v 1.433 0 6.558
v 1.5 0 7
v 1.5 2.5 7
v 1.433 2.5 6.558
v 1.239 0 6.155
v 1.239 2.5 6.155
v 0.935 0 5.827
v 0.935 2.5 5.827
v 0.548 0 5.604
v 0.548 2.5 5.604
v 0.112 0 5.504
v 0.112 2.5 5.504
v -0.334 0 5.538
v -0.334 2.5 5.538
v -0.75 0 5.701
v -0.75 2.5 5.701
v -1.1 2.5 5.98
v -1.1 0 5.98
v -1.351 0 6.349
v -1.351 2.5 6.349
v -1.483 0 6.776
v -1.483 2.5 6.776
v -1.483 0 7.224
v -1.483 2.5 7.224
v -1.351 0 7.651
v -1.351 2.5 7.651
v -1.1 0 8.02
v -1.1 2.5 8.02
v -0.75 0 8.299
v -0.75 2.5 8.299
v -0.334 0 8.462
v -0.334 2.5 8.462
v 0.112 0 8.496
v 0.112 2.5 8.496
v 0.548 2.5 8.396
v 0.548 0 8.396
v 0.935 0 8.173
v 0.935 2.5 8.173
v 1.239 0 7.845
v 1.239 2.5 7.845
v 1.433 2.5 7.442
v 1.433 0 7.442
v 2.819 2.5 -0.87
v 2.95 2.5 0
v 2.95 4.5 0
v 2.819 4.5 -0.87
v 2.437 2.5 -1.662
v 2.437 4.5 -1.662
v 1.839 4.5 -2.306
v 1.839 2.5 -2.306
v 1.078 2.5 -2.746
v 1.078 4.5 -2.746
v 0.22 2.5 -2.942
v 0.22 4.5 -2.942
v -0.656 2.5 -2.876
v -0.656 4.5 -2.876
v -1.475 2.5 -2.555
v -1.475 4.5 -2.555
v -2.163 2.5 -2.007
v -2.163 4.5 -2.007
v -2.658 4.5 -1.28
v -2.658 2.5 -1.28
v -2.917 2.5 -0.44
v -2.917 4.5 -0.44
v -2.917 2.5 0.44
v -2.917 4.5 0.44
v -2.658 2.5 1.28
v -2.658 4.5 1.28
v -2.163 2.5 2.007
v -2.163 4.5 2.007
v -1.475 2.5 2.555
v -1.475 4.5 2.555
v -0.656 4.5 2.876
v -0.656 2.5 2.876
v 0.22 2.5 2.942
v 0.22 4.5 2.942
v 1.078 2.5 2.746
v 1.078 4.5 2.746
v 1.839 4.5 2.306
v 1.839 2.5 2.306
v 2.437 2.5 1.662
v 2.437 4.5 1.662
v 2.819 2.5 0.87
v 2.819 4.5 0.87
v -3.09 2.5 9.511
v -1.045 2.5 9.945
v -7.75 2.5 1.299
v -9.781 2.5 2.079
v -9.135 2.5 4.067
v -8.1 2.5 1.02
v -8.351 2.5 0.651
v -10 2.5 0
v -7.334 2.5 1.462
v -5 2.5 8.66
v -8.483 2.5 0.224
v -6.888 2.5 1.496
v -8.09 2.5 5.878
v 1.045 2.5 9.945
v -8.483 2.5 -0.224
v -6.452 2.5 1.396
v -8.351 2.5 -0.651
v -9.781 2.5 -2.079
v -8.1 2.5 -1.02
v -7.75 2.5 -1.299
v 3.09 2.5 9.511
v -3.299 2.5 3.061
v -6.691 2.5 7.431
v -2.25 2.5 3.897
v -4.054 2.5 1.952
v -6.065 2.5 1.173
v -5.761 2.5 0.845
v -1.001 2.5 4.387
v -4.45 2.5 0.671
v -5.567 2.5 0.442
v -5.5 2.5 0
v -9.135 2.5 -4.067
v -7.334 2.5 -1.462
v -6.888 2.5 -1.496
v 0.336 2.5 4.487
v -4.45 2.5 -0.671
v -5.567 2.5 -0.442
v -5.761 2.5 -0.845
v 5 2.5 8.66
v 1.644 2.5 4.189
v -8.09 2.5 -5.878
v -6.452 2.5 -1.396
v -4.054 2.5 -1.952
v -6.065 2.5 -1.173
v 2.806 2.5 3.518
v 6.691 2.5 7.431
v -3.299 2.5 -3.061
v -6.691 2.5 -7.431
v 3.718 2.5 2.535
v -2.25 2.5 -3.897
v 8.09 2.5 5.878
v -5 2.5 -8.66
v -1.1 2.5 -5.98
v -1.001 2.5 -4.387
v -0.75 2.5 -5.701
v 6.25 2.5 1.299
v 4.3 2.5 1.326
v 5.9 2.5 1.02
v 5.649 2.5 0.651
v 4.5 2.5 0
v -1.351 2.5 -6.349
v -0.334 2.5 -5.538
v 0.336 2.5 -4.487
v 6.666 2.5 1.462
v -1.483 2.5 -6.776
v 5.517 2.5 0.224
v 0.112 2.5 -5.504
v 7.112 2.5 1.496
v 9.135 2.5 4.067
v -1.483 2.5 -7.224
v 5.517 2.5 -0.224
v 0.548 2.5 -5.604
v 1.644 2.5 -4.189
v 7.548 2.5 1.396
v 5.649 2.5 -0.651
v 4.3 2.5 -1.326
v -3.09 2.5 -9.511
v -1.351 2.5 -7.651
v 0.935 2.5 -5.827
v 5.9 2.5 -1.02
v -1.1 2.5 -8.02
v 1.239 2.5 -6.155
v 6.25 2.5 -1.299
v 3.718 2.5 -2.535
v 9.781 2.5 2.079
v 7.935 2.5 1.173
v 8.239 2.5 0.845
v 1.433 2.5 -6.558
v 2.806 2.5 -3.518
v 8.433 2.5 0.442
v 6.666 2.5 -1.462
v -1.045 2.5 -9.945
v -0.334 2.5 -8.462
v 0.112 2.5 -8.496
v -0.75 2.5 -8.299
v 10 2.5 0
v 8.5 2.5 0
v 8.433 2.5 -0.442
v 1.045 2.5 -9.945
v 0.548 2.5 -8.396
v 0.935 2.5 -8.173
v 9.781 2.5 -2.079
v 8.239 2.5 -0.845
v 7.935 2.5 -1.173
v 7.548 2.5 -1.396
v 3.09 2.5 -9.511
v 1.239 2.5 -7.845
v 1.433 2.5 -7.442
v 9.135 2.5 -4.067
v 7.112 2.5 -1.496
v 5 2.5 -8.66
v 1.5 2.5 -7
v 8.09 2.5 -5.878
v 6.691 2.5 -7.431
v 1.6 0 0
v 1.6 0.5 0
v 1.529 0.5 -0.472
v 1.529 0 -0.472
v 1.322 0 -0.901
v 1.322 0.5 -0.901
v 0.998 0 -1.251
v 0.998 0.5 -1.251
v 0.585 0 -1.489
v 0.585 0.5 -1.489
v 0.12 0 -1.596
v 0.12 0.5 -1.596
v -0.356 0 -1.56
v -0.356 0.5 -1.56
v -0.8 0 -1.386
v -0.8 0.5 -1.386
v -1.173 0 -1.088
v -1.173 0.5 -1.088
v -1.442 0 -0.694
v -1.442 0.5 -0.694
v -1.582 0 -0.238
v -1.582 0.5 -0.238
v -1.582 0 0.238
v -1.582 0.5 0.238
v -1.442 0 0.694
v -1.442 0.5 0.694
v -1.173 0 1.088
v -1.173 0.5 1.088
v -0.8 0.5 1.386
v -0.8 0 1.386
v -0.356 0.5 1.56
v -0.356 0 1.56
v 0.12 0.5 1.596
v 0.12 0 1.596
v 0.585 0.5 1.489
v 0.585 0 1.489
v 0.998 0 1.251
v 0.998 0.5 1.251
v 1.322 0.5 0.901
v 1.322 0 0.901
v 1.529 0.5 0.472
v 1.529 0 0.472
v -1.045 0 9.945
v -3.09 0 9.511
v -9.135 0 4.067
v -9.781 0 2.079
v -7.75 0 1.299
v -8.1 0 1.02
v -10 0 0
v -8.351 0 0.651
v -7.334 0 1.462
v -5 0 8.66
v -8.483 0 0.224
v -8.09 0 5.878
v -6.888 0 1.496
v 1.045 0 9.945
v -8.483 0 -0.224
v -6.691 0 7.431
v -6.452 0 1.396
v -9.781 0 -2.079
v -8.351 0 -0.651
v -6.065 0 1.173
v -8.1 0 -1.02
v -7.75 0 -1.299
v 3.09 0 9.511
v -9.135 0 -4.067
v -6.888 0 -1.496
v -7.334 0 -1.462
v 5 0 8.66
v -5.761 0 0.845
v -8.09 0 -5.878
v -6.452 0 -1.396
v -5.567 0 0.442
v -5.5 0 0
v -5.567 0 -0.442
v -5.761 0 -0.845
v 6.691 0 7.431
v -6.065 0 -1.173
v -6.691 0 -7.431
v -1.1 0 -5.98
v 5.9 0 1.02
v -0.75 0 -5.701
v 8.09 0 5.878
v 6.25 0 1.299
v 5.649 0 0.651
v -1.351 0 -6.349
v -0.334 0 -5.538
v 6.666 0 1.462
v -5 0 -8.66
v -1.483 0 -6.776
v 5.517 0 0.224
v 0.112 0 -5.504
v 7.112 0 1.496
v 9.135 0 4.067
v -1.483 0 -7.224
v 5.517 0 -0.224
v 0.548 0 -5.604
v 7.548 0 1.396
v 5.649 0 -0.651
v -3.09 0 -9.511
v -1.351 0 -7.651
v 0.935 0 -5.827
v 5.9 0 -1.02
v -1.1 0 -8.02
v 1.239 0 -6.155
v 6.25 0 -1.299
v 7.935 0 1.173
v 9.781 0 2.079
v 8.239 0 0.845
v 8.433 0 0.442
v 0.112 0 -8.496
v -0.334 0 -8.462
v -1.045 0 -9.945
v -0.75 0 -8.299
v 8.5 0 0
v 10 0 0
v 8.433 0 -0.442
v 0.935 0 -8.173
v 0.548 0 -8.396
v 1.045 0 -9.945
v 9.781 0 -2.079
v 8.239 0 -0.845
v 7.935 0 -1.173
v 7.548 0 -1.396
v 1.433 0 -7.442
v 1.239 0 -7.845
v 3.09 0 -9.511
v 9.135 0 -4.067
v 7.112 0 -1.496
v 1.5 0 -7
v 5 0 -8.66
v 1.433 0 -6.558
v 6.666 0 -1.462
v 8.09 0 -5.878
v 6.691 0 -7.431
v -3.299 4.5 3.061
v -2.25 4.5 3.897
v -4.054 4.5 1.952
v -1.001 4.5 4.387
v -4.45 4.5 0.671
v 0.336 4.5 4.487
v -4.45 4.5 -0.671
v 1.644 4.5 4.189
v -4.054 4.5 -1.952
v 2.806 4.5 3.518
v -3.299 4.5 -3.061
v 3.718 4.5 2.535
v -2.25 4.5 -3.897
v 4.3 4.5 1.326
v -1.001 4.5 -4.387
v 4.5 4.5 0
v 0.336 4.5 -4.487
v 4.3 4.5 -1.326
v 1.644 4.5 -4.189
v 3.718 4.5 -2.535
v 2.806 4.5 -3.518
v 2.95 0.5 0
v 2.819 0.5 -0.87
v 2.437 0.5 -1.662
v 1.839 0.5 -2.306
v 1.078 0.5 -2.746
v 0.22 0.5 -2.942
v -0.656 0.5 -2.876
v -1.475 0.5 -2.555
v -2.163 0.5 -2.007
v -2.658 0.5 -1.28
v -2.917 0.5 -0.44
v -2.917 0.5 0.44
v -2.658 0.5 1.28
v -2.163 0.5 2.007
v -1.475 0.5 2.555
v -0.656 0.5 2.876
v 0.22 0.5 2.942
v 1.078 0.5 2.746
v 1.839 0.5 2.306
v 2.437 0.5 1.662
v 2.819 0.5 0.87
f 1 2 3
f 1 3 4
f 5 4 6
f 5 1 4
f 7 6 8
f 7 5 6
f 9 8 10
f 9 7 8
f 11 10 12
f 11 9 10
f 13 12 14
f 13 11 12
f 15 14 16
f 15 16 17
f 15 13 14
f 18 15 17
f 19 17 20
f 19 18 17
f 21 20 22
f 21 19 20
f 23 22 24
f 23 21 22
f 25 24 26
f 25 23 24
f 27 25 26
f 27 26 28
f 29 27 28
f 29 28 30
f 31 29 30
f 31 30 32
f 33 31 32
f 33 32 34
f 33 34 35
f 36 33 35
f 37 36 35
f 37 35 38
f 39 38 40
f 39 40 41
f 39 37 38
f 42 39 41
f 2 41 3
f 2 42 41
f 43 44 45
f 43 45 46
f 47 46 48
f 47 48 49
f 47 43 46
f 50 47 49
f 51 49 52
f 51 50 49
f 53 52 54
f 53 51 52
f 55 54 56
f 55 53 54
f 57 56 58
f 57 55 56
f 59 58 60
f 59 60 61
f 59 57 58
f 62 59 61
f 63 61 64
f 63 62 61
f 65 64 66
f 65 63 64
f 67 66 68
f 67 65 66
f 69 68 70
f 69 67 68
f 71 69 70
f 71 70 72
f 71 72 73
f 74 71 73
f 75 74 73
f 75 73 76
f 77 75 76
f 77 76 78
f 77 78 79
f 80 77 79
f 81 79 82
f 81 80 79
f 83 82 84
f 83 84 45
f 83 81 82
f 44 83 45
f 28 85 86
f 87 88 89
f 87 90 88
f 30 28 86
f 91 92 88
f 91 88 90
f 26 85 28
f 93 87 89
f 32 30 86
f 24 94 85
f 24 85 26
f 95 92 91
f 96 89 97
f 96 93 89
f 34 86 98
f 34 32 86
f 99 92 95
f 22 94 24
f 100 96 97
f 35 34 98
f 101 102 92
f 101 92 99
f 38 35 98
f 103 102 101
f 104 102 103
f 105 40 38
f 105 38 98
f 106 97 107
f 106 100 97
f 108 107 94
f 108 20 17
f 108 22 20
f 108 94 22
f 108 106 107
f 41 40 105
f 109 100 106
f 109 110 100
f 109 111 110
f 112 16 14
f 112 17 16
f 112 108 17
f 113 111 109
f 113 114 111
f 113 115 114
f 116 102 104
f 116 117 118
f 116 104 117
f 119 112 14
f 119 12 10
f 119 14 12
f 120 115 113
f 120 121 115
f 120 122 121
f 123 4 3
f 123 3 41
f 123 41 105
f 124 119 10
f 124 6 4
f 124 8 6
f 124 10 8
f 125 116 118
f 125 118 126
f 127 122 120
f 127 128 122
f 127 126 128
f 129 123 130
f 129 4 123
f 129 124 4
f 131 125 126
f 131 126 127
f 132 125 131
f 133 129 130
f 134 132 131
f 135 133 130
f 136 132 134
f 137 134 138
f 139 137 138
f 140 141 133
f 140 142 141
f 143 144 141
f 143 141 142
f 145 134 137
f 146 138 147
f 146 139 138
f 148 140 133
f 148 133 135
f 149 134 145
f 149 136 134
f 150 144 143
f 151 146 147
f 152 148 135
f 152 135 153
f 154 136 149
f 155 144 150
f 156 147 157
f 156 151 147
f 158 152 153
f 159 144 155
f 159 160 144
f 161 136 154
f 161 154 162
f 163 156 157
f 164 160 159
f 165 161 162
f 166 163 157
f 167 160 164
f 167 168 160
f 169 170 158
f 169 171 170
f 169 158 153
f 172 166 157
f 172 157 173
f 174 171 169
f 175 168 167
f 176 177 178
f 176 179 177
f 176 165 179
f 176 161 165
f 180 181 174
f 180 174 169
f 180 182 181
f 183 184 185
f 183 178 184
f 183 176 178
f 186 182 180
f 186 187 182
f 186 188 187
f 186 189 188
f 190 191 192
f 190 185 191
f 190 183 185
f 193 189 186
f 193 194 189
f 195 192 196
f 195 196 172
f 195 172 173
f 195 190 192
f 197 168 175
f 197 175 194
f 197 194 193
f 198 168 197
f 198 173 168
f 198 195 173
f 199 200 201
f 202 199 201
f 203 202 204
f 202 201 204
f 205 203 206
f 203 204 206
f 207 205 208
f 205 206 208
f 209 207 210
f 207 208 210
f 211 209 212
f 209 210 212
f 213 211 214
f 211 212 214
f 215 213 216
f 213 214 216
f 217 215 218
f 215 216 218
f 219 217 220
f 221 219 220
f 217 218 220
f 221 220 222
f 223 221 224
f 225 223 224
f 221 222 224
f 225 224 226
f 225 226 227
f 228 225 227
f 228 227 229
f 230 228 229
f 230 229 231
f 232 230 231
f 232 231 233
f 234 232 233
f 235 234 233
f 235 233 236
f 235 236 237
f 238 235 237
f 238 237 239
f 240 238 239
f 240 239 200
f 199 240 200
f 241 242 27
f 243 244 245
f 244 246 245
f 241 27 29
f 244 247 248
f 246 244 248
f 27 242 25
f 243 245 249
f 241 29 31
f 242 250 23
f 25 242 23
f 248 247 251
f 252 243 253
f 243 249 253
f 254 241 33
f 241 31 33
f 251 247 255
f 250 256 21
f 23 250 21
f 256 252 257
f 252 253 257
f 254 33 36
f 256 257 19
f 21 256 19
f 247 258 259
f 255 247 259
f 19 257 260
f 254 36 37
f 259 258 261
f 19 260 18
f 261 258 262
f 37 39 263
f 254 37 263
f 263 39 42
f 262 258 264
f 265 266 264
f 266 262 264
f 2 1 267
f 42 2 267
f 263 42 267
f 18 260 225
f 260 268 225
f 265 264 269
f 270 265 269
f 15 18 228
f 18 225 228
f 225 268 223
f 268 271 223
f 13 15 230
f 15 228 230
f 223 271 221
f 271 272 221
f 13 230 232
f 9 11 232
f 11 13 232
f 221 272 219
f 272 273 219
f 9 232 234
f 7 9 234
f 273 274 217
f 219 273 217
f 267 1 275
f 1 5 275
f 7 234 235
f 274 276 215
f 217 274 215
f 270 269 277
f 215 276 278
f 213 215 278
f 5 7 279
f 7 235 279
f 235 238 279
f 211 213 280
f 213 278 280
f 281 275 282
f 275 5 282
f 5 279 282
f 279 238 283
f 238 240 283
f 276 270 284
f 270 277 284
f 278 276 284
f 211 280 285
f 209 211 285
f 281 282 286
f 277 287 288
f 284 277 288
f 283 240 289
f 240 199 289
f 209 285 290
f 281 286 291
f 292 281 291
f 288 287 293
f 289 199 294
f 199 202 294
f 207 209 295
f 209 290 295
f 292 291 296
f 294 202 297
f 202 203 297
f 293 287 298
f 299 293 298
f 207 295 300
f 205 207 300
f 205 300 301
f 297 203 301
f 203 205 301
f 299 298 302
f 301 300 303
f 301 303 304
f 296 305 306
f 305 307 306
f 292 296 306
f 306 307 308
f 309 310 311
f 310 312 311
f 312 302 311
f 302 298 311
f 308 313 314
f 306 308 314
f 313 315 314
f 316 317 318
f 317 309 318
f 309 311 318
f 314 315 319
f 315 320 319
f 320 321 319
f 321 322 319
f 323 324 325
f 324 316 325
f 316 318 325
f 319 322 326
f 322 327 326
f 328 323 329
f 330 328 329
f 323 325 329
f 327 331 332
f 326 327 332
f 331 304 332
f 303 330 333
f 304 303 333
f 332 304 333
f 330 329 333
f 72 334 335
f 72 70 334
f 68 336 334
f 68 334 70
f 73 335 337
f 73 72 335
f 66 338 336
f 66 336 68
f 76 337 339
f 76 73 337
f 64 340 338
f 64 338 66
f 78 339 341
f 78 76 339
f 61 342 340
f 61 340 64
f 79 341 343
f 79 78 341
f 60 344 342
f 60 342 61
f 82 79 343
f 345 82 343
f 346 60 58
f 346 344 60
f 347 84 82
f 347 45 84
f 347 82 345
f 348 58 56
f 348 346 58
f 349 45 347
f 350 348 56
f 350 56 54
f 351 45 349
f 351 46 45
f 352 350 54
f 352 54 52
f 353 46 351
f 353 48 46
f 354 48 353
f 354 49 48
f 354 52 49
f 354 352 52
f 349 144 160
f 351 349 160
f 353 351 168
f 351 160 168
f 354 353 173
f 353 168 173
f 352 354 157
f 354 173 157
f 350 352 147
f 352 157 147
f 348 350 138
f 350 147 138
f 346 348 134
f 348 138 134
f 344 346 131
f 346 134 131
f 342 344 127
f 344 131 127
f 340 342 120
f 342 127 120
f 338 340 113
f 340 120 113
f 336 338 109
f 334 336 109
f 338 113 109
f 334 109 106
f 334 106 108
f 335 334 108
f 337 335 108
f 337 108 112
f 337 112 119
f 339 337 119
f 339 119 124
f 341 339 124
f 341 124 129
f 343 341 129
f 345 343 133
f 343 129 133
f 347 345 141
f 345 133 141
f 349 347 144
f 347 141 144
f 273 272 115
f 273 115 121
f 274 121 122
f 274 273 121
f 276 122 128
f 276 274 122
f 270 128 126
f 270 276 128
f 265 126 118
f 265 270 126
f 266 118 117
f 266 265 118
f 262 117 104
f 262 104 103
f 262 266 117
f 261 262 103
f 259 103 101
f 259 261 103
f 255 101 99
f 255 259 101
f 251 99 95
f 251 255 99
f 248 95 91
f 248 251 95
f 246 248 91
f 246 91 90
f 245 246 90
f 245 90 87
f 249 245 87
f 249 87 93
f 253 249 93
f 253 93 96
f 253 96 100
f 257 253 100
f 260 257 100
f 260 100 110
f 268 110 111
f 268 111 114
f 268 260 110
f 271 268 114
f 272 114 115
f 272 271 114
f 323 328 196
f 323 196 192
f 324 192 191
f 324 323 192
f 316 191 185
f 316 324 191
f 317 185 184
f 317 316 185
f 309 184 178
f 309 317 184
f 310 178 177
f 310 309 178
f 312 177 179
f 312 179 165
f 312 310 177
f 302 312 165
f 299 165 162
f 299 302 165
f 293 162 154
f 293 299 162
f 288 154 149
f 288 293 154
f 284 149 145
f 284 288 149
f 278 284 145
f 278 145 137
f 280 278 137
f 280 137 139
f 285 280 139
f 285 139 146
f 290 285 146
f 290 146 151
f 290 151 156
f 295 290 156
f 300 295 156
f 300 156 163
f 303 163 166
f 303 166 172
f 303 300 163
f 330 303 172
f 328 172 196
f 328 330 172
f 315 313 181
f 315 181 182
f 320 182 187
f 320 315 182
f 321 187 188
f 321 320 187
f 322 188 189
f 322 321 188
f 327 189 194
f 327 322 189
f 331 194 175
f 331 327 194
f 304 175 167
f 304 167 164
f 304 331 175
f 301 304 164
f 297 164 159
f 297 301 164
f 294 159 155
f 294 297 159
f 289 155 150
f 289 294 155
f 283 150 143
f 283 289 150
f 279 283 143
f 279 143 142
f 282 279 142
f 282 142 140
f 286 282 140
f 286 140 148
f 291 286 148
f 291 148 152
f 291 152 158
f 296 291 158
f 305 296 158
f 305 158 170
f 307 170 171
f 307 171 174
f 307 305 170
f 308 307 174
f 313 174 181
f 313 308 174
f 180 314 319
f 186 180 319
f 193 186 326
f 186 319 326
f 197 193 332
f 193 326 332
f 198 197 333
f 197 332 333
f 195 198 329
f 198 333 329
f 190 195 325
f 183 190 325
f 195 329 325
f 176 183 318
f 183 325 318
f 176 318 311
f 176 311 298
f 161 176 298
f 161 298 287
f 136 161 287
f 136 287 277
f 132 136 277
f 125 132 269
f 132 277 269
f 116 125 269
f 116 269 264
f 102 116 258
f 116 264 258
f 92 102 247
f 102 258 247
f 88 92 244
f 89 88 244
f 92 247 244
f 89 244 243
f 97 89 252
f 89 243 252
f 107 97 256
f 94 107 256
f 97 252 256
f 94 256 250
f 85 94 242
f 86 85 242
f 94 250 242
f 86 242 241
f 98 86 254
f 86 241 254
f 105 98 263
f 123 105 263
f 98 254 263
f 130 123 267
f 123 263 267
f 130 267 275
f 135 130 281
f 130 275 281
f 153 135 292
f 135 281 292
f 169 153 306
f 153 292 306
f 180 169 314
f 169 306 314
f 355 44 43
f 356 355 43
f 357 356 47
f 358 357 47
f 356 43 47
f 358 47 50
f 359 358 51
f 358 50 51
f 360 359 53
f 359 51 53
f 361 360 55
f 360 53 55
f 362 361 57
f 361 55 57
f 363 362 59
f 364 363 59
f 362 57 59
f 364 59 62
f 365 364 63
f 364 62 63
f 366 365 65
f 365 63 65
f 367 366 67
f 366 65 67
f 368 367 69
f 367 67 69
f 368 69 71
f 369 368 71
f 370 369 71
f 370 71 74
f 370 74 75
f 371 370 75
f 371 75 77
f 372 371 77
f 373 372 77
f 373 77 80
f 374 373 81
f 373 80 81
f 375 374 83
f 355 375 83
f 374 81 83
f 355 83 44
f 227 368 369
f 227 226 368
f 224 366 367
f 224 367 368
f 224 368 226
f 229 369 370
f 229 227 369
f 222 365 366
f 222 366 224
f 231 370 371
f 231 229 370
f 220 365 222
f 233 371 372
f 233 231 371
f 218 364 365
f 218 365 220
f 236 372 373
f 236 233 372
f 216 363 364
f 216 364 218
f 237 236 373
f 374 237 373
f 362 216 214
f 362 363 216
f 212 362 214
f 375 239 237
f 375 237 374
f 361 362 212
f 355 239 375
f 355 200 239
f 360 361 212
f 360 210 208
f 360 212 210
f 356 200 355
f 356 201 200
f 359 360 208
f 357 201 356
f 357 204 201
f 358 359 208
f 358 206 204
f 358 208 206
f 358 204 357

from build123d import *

# Parameters (mm, degrees)
IZIM1_R                     = 10
IZIM1_R_2                   = 1.5
Y_KSEKLIK_EKSTR_ZYON1_DEPTH = 2.5
IZIM2_R                     = 4.5
IZIM2_R_2                   = 2.95
Y_KSEKLIK_EKSTR_ZYON2_DEPTH = 2
IZIM3_R                     = 1.6
KES_EKSTR_ZYON1_DEPTH       = 3.5
IZIM4_R                     = 2.95
IZIM4_R_2                   = 1.6
KES_EKSTR_ZYON2_DEPTH       = 2


with BuildPart() as part:
    # Çizim1 → Yükseklik-Ekstrüzyon1 (new body)
    with BuildSketch(Plane(origin=(0, 0, 0), x_dir=(1, 0, 0), z_dir=(0, 1, 0))):
        Circle(IZIM1_R)
        with Locations((0, 7)):
            Circle(IZIM1_R_2, mode=Mode.SUBTRACT)
        with Locations((7, 0)):
            Circle(IZIM1_R_2, mode=Mode.SUBTRACT)
        with Locations((0, -7)):
            Circle(IZIM1_R_2, mode=Mode.SUBTRACT)
        with Locations((-7, 0)):
            Circle(IZIM1_R_2, mode=Mode.SUBTRACT)
    extrude(amount=Y_KSEKLIK_EKSTR_ZYON1_DEPTH)

    # Çizim2 → Yükseklik-Ekstrüzyon2 (add)
    with BuildSketch(Plane(origin=(0, 2.5, 0), x_dir=(1, 0, 0), z_dir=(0, 1, 0))):
        Circle(IZIM2_R)
        Circle(IZIM2_R_2, mode=Mode.SUBTRACT)
    extrude(amount=Y_KSEKLIK_EKSTR_ZYON2_DEPTH)

    # Çizim3 → Kes-Ekstrüzyon1 (cut, through all)
    with BuildSketch(Plane(origin=(0, 2.5, 0), x_dir=(1, 0, 0), z_dir=(0, 1, 0))):
        Circle(IZIM3_R)
    extrude(amount=-KES_EKSTR_ZYON1_DEPTH, mode=Mode.SUBTRACT)

    # Çizim4 → Kes-Ekstrüzyon2 (cut)
    with BuildSketch(Plane(origin=(0, 2.5, 0), x_dir=(1, 0, 0), z_dir=(0, 1, 0))):
        Circle(IZIM4_R)
        Circle(IZIM4_R_2, mode=Mode.SUBTRACT)
    extrude(amount=-KES_EKSTR_ZYON2_DEPTH, mode=Mode.SUBTRACT)


solid = part.part
